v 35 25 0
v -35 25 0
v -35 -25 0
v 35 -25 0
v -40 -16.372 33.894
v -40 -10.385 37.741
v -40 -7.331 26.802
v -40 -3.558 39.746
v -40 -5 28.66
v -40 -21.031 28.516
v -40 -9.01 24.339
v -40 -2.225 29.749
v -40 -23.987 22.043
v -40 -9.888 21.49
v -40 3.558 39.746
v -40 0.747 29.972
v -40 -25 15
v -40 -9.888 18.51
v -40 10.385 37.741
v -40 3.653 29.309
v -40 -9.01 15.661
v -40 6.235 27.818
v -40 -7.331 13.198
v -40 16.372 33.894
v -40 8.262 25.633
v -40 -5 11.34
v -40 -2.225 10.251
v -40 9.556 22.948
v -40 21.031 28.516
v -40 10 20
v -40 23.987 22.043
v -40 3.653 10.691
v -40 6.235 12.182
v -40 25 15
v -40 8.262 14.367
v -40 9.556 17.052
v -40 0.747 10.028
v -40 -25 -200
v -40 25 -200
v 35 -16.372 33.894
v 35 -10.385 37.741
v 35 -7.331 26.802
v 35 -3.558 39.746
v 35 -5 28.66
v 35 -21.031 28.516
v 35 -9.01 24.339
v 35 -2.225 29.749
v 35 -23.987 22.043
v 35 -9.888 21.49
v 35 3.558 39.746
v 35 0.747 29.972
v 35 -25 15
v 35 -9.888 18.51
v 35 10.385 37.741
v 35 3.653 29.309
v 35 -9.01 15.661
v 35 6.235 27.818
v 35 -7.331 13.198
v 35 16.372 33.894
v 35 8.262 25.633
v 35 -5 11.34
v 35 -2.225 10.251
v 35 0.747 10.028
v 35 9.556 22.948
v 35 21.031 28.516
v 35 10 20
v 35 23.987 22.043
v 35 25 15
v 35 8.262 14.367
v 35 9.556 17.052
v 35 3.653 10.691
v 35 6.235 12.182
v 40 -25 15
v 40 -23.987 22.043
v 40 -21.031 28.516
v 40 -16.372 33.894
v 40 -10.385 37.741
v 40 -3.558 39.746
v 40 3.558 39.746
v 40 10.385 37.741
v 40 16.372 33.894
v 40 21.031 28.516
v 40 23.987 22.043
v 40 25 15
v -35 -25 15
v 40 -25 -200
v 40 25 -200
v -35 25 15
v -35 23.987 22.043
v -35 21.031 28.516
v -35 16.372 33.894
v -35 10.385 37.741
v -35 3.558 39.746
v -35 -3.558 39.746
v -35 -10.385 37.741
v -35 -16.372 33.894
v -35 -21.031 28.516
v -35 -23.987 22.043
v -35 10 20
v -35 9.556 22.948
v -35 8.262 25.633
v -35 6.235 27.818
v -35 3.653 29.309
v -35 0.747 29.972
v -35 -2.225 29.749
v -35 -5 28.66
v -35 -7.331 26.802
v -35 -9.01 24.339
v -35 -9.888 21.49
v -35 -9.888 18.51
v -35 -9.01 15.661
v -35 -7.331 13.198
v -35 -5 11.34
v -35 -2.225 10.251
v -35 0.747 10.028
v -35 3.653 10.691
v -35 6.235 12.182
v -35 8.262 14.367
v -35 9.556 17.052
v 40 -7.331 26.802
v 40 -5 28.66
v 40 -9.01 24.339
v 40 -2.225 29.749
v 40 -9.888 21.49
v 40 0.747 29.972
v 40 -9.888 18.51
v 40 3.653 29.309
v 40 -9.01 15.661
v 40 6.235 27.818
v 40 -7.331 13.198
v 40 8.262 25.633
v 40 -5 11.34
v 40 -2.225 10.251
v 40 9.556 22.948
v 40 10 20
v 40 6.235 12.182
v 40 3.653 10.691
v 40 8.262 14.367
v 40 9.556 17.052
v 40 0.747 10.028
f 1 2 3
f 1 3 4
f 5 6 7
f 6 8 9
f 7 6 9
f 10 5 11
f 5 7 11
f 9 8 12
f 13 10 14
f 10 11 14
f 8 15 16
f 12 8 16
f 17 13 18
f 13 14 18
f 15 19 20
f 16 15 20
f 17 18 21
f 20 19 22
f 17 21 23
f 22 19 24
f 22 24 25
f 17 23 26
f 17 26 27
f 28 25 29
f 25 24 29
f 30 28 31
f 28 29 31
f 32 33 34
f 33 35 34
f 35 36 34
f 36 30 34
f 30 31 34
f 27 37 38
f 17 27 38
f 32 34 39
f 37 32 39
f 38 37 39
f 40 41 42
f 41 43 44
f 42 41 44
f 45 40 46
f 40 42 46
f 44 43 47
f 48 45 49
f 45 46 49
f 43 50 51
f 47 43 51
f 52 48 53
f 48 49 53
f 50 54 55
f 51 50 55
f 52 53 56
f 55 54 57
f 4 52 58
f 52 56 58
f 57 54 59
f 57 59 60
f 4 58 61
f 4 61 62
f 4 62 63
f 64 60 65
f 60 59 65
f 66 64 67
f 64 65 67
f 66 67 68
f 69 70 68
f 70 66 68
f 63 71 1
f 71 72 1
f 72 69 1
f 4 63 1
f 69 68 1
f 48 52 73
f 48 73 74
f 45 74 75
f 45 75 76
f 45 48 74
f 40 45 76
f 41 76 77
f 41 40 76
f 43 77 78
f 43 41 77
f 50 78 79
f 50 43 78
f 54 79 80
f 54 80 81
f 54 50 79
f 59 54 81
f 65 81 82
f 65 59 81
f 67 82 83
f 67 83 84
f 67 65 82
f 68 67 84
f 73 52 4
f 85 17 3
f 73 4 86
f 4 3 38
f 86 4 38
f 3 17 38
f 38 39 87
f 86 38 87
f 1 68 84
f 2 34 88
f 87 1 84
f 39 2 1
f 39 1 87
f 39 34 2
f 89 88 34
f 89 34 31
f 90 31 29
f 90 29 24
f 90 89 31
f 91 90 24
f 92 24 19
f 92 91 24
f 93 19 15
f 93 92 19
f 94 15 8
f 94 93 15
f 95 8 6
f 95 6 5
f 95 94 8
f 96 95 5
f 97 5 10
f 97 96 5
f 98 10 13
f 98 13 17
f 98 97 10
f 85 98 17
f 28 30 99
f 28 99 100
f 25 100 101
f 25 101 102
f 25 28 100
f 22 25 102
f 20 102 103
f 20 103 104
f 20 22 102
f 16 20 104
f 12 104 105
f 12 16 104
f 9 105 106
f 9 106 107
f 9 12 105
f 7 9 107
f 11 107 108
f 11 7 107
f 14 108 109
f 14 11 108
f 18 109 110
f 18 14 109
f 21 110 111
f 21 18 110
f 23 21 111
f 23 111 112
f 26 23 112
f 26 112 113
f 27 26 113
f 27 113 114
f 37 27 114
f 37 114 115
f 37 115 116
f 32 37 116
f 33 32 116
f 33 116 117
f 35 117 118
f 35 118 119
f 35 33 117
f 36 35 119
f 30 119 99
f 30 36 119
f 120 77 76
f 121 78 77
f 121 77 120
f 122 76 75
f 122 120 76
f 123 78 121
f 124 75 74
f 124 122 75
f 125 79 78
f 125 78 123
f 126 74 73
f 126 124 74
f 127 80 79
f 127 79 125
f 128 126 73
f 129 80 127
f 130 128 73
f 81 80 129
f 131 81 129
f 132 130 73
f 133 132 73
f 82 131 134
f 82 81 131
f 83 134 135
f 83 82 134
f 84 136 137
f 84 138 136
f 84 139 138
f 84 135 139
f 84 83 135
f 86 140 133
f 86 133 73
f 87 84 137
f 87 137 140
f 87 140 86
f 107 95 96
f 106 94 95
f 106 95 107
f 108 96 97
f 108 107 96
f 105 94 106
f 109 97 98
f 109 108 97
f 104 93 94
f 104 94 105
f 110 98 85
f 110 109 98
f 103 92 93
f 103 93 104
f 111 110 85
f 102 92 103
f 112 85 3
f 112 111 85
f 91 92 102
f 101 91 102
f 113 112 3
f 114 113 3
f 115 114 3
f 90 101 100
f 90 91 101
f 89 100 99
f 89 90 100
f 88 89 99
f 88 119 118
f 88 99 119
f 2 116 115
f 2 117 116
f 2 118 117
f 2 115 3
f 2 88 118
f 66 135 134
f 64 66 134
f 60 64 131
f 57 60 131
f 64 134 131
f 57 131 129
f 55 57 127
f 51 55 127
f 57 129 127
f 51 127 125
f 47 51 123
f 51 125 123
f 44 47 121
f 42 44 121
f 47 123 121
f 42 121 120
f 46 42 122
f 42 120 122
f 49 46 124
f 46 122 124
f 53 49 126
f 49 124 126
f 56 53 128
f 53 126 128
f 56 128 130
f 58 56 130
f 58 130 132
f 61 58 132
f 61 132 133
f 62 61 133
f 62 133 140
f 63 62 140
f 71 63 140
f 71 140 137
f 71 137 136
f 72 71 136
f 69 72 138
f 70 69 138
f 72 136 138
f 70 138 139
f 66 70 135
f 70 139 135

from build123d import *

# Parameters (mm, degrees)
SKETCH1_W                   = 80
SKETCH1_H                   = 50
BOSS_EXTRUDE1_DEPTH         = 200
SKETCH4_W                   = 40
SKETCH4_H                   = 50
SKETCH4_R                   = 10
BOSS_EXTRUDE3_DEPTH         = 5
FILLET1_RADIUS              = 25
FILLET1_LENGTH              = 5
FILLET1_OF_MIRROR1_2_RADIUS = 25
FILLET1_OF_MIRROR1_2_LENGTH = 5


with BuildPart() as part:
    # Sketch1 → Boss-Extrude1 (new body)
    with BuildSketch(Plane.XY):
        Rectangle(SKETCH1_W, SKETCH1_H)
    extrude(amount=-BOSS_EXTRUDE1_DEPTH)

    # Sketch4 → Boss-Extrude3 (add)
    with BuildSketch(Plane(origin=(40, 0, 0), x_dir=(0, 0, -1), z_dir=(1, 0, 0))):
        with Locations((-20, 0)):
            Rectangle(SKETCH4_W, SKETCH4_H)
        with Locations(Location((-20, 0, 0), (0, 0, 90))):
            Circle(SKETCH4_R, mode=Mode.SUBTRACT)
    boss_extrude3 = extrude(amount=-BOSS_EXTRUDE3_DEPTH)

    # Fillet1: full round fillet: the end face becomes a half cylinder, R = half its width
    fillet1_face = Plane((37.5, 0, 40), x_dir=(-1, 0, 0), z_dir=(0, 0, 1))  # on the end face: x along it, z out of the body
    fillet1_slab = fillet1_face.offset(-FILLET1_RADIUS / 2) * Box(FILLET1_LENGTH, 2 * FILLET1_RADIUS, FILLET1_RADIUS, mode=Mode.PRIVATE)  # the body's end, R deep
    fillet1_round = Plane((37.5, 0, 15), x_dir=(0, 0, 1), z_dir=(-1, 0, 0)) * Cylinder(FILLET1_RADIUS, FILLET1_LENGTH, mode=Mode.PRIVATE)  # its axis R under the face
    add(fillet1_slab - fillet1_round, mode=Mode.SUBTRACT)

    # Mirror1: Boss-Extrude3 across plane
    add(boss_extrude3.mirror(Plane(origin=(0, 0, 0), x_dir=(0, 0, 1), z_dir=(1, 0, 0))))

    # Fillet1 of Mirror1 2: full round fillet: the end face becomes a half cylinder, R = half its width
    fillet1_of_mirror1_2_face = Plane((-37.5, 0, 40), x_dir=(1, 0, 0), z_dir=(0, 0, 1))  # on the end face: x along it, z out of the body
    fillet1_of_mirror1_2_slab = fillet1_of_mirror1_2_face.offset(-FILLET1_OF_MIRROR1_2_RADIUS / 2) * Box(FILLET1_OF_MIRROR1_2_LENGTH, 2 * FILLET1_OF_MIRROR1_2_RADIUS, FILLET1_OF_MIRROR1_2_RADIUS, mode=Mode.PRIVATE)  # the body's end, R deep
    fillet1_of_mirror1_2_round = Plane((-37.5, 0, 15), x_dir=(0, 0, 1), z_dir=(1, 0, 0)) * Cylinder(FILLET1_OF_MIRROR1_2_RADIUS, FILLET1_OF_MIRROR1_2_LENGTH, mode=Mode.PRIVATE)  # its axis R under the face
    add(fillet1_of_mirror1_2_slab - fillet1_of_mirror1_2_round, mode=Mode.SUBTRACT)


solid = part.part
